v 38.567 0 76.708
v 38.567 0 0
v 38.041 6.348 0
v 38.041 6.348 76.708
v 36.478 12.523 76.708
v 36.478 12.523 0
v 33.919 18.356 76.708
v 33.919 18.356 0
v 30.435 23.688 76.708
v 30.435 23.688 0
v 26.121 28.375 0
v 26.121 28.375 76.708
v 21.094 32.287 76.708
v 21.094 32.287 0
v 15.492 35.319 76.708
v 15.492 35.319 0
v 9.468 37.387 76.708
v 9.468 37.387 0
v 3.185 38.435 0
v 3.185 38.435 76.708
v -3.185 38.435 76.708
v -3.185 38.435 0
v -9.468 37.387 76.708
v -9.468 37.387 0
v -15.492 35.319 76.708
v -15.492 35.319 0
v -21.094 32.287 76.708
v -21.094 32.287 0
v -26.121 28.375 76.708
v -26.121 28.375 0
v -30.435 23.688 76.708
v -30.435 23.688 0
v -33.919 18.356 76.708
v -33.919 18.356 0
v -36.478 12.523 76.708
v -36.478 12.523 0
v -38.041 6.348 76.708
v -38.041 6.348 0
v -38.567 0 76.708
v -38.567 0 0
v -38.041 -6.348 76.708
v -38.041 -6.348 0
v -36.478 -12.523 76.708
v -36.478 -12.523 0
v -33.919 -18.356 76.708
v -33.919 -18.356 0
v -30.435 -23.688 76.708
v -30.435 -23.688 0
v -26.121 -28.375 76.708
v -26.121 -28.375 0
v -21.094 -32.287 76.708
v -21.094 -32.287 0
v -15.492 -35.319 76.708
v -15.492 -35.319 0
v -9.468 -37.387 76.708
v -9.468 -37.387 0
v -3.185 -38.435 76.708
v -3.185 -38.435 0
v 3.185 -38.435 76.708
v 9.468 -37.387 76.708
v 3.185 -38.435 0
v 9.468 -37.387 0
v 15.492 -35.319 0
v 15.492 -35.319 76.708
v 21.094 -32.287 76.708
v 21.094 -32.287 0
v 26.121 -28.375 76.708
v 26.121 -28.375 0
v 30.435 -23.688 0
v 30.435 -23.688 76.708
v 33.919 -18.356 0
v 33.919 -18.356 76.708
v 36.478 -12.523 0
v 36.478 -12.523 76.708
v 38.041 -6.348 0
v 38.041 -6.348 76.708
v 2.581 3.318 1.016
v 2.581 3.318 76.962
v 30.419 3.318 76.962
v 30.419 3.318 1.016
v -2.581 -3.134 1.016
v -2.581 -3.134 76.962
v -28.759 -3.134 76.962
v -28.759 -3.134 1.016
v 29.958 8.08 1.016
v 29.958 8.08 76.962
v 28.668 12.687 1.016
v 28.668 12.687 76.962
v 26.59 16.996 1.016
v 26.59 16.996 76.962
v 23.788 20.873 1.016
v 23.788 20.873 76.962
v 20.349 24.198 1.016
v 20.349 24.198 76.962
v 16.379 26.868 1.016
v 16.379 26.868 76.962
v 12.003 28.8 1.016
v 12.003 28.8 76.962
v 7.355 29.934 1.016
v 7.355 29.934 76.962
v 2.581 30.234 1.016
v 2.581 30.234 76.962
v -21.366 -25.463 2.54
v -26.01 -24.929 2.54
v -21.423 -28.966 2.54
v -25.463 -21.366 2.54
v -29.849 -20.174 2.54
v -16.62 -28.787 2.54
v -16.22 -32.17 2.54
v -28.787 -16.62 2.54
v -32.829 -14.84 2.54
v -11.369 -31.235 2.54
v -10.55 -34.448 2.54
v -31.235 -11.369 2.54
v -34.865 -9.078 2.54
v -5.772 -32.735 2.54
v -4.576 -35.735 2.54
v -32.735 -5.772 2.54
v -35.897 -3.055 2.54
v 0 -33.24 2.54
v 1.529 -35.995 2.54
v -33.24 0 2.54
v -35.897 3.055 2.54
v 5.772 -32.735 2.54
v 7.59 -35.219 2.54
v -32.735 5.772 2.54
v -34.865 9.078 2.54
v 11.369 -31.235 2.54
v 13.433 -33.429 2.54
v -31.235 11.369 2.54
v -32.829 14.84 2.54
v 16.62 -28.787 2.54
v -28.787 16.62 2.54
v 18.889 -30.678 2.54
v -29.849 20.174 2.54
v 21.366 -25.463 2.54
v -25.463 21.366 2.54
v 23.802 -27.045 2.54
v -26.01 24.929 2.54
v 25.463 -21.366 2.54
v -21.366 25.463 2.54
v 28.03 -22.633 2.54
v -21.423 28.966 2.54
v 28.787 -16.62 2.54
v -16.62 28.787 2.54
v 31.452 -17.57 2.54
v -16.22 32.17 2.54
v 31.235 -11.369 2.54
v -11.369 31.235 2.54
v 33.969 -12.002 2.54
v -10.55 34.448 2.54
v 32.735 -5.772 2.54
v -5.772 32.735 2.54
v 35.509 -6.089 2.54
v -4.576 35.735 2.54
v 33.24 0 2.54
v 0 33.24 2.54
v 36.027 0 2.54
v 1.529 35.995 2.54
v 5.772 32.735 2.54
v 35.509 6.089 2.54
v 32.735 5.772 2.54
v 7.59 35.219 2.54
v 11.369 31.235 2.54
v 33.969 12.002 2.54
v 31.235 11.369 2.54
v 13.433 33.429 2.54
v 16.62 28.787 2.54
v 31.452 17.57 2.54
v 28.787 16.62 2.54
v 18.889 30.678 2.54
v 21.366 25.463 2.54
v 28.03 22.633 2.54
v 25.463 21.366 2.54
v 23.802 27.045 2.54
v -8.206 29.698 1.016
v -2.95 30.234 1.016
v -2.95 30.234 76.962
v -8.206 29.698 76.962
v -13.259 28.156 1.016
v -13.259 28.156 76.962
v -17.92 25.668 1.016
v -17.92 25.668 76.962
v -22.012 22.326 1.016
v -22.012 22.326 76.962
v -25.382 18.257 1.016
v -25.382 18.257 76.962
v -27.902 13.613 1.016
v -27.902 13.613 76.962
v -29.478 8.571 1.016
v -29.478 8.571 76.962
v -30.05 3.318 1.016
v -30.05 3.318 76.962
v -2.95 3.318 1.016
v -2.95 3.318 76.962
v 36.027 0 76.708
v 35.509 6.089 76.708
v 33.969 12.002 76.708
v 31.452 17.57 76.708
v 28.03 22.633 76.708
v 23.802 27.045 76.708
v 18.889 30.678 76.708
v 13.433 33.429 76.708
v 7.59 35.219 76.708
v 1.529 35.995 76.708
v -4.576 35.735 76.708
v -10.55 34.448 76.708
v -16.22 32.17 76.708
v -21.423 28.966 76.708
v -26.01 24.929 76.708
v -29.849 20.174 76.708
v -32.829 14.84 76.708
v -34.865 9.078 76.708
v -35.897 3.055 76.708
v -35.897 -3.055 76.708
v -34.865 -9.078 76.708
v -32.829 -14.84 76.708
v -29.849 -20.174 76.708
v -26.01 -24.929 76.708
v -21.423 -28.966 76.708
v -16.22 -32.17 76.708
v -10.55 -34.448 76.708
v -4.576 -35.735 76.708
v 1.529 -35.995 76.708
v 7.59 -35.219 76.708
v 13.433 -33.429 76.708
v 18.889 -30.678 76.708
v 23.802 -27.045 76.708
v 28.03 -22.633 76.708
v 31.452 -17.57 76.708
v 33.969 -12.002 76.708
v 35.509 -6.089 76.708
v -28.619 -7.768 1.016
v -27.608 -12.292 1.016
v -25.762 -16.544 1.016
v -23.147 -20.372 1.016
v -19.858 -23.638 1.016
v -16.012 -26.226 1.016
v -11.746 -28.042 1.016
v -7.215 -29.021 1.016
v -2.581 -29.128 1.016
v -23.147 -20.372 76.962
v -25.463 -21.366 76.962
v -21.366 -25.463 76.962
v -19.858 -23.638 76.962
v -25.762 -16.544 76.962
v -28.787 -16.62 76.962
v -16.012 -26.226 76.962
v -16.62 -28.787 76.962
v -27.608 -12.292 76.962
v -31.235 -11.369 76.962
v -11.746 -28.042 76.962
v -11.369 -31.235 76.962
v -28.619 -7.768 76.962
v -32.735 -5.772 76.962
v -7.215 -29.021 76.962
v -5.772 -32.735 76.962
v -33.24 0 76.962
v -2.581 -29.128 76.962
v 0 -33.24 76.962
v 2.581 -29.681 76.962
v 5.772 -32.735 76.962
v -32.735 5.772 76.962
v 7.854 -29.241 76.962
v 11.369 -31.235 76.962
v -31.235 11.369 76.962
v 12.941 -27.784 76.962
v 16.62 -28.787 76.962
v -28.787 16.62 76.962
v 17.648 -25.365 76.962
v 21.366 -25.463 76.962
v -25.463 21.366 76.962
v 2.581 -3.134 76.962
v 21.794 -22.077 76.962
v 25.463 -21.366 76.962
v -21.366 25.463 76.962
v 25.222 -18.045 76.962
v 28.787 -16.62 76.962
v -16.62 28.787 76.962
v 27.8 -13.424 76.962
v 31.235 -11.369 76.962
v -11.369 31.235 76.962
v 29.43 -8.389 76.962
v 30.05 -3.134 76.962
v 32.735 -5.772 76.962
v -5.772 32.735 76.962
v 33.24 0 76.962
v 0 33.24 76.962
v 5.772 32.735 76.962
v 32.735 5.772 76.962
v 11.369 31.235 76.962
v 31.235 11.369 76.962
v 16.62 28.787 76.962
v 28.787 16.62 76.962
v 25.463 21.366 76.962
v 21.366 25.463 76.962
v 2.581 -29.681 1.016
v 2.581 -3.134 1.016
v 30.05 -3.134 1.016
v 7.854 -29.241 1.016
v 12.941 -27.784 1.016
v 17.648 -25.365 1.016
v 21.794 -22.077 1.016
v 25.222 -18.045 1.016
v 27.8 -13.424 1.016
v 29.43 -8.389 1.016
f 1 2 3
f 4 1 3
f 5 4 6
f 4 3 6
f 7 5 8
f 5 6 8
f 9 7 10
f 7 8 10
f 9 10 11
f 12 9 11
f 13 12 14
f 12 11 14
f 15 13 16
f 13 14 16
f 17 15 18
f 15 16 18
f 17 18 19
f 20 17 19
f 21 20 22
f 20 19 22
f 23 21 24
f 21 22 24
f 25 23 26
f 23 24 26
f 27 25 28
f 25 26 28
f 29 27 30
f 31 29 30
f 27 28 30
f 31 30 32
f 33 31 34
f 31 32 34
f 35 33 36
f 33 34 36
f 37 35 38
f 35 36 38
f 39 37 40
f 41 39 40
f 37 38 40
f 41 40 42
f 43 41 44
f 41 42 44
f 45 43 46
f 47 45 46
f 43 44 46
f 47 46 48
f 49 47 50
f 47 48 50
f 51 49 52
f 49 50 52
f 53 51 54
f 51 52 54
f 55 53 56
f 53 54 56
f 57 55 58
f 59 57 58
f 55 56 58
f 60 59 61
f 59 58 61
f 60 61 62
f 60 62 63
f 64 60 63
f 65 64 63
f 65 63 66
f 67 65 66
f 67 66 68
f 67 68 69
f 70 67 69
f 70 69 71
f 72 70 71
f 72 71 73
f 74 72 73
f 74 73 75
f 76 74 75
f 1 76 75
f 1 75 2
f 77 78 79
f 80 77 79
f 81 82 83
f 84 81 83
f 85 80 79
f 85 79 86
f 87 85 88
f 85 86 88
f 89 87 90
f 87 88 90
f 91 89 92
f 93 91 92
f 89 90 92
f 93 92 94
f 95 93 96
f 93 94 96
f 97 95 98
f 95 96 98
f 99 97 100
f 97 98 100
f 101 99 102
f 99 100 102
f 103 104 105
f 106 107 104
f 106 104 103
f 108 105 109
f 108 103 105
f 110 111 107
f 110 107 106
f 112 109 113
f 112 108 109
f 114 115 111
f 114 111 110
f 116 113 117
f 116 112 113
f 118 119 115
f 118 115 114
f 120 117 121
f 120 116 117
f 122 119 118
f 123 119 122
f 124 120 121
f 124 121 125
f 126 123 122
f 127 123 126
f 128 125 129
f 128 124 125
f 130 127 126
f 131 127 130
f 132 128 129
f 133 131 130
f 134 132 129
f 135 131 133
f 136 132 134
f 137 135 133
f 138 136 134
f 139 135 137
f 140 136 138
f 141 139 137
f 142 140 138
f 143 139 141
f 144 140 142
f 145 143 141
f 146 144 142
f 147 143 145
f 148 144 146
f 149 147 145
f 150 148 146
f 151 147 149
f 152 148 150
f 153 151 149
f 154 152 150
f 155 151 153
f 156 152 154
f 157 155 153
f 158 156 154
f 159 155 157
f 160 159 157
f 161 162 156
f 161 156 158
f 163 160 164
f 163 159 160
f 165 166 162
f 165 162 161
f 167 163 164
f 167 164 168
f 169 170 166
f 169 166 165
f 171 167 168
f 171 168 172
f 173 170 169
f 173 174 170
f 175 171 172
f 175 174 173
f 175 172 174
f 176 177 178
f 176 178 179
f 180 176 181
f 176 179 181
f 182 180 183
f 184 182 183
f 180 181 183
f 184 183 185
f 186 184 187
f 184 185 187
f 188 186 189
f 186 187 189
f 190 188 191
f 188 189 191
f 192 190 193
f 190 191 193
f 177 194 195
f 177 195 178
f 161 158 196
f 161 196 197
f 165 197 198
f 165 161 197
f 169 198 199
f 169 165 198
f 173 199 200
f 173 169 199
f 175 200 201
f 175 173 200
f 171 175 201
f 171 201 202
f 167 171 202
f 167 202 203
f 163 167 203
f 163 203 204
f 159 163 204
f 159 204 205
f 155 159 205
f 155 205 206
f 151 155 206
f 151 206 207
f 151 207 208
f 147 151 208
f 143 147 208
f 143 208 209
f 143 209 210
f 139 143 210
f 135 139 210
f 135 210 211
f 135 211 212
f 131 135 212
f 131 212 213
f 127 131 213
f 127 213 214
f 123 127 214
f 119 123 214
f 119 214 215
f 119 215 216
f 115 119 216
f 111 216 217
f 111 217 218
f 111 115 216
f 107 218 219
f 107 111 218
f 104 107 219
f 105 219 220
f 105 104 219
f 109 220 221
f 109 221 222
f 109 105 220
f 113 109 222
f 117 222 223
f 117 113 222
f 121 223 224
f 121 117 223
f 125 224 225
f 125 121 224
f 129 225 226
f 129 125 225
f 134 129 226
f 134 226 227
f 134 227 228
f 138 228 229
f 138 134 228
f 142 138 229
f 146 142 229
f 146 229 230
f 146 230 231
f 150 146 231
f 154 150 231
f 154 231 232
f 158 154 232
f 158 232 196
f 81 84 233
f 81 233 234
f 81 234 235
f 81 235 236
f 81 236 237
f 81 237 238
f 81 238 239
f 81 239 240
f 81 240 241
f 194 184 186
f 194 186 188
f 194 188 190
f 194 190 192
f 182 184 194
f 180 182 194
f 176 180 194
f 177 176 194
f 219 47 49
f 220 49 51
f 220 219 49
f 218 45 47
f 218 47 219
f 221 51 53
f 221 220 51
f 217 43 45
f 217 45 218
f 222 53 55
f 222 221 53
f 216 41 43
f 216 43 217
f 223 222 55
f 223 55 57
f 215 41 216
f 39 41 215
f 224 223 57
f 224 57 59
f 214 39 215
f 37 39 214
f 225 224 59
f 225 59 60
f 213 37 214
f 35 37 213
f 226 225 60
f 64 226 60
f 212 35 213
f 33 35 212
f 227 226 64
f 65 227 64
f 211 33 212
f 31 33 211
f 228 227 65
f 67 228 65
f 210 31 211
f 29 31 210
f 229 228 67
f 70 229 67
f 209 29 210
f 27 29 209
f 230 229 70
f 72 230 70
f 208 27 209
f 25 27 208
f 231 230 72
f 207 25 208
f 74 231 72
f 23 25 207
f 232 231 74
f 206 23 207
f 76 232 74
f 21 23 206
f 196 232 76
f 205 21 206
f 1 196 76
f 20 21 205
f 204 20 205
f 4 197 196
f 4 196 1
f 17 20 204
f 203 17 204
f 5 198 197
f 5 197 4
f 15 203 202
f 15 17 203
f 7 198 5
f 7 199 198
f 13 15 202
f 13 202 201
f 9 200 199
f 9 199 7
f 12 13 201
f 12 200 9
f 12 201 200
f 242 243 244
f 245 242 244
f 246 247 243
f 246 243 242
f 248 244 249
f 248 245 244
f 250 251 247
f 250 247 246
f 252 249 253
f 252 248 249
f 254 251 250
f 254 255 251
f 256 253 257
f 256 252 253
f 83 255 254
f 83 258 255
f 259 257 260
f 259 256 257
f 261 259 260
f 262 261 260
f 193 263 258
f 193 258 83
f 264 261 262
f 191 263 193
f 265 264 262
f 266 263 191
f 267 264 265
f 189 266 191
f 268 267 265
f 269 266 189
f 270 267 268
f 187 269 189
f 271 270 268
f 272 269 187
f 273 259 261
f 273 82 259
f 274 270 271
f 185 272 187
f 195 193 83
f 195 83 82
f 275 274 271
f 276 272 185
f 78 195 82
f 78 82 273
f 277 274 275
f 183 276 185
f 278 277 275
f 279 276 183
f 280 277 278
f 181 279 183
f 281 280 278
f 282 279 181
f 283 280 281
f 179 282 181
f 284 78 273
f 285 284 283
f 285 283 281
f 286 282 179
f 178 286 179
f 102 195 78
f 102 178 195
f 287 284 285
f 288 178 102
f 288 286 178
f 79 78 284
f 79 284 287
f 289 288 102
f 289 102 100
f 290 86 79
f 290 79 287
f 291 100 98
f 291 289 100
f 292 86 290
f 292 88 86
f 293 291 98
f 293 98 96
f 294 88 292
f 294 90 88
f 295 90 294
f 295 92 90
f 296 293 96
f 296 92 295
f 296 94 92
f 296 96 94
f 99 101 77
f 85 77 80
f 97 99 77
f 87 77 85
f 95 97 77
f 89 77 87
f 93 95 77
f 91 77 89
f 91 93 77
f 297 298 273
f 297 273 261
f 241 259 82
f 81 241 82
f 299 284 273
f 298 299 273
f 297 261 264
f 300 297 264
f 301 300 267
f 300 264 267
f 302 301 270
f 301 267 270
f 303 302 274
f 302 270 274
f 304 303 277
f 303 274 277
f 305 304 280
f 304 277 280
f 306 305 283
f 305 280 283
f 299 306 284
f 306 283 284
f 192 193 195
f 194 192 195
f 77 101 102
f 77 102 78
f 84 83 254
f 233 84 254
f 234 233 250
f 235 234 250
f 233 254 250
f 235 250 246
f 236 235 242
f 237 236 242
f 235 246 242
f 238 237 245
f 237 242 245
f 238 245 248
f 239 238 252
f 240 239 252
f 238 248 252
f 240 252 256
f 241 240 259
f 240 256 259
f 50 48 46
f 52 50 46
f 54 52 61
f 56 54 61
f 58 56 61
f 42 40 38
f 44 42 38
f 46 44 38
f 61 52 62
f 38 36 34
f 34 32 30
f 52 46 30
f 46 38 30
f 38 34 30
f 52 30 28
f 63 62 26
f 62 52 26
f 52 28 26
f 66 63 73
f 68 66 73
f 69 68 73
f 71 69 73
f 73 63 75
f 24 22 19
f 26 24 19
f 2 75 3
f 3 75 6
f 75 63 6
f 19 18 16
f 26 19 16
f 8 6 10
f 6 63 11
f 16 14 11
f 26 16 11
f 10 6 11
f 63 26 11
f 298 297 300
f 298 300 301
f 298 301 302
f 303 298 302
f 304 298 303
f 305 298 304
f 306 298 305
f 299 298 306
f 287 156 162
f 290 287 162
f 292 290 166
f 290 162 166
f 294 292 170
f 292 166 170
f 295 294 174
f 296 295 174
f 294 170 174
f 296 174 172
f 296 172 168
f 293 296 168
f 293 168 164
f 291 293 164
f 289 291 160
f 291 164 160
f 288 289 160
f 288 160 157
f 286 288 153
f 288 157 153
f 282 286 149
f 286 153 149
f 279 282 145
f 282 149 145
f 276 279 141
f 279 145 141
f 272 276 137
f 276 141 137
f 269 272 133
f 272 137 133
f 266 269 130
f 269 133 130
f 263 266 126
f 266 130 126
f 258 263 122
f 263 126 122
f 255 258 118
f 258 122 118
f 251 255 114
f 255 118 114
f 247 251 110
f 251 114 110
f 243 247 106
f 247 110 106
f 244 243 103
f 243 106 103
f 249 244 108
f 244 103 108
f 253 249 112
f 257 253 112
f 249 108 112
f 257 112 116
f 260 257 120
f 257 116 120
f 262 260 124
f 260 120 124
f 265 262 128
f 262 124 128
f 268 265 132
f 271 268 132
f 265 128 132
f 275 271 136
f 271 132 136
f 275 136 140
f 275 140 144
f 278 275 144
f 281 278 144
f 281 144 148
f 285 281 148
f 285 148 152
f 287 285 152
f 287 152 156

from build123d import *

# Parameters (mm, degrees)
F0_R     = 38.567191
F1_DEPTH = 76.708
F2_T     = -2.54
F3_R     = 33.240041
F4_DEPTH = 74.422
F6_DEPTH = 75.946


with BuildPart() as f1:
    # F0 (on Top) → F1 (new body)
    with BuildSketch(Plane.XY):
        Circle(F0_R)
    extrude(amount=F1_DEPTH)

    # F2
    f2_openings = [f1.faces().sort_by_distance(p)[0] for p in [
        (0, 0, 76.708),
    ]]
    offset(amount=F2_T, openings=f2_openings)

    # F3 (on face) → F4 (join)
    with BuildSketch(Plane.XY.offset(2.54)):
        Circle(F3_R)
    extrude(amount=F4_DEPTH)

    # F5 (on face) → F6 (cut)
    with BuildSketch(Plane.XY.offset(76.962)):
        with BuildLine():
            ThreePointArc((30.418547, 3.318387), (22.14181, 22.611564), (2.580967, 30.234193))
            Line((2.580967, 30.234193), (2.580967, 3.318387))
            Line((2.580967, 3.318387), (30.418547, 3.318387))
        make_face()
        with BuildLine():
            Line((30.049838, -3.134032), (2.580967, -3.134032))
            Line((2.580967, -3.134032), (2.580967, -29.681129))
            ThreePointArc((2.580967, -29.681129), (21.794231, -22.076646), (30.049838, -3.134032))
        make_face()
        with BuildLine():
            Line((-2.949678, 3.318387), (-2.949678, 30.234193))
            ThreePointArc((-2.949678, 30.234193), (-22.011865, 22.326152), (-30.049838, 3.318387))
            Line((-30.049838, 3.318387), (-2.949678, 3.318387))
        make_face()
        with BuildLine():
            Line((-2.580968, -29.128065), (-2.580968, -3.134032))
            Line((-2.580968, -3.134032), (-28.759355, -3.134032))
            ThreePointArc((-28.759355, -3.134032), (-21.580145, -22.082946), (-2.580968, -29.128065))
        make_face()
    extrude(amount=-F6_DEPTH, mode=Mode.SUBTRACT)


solid = f1.part
